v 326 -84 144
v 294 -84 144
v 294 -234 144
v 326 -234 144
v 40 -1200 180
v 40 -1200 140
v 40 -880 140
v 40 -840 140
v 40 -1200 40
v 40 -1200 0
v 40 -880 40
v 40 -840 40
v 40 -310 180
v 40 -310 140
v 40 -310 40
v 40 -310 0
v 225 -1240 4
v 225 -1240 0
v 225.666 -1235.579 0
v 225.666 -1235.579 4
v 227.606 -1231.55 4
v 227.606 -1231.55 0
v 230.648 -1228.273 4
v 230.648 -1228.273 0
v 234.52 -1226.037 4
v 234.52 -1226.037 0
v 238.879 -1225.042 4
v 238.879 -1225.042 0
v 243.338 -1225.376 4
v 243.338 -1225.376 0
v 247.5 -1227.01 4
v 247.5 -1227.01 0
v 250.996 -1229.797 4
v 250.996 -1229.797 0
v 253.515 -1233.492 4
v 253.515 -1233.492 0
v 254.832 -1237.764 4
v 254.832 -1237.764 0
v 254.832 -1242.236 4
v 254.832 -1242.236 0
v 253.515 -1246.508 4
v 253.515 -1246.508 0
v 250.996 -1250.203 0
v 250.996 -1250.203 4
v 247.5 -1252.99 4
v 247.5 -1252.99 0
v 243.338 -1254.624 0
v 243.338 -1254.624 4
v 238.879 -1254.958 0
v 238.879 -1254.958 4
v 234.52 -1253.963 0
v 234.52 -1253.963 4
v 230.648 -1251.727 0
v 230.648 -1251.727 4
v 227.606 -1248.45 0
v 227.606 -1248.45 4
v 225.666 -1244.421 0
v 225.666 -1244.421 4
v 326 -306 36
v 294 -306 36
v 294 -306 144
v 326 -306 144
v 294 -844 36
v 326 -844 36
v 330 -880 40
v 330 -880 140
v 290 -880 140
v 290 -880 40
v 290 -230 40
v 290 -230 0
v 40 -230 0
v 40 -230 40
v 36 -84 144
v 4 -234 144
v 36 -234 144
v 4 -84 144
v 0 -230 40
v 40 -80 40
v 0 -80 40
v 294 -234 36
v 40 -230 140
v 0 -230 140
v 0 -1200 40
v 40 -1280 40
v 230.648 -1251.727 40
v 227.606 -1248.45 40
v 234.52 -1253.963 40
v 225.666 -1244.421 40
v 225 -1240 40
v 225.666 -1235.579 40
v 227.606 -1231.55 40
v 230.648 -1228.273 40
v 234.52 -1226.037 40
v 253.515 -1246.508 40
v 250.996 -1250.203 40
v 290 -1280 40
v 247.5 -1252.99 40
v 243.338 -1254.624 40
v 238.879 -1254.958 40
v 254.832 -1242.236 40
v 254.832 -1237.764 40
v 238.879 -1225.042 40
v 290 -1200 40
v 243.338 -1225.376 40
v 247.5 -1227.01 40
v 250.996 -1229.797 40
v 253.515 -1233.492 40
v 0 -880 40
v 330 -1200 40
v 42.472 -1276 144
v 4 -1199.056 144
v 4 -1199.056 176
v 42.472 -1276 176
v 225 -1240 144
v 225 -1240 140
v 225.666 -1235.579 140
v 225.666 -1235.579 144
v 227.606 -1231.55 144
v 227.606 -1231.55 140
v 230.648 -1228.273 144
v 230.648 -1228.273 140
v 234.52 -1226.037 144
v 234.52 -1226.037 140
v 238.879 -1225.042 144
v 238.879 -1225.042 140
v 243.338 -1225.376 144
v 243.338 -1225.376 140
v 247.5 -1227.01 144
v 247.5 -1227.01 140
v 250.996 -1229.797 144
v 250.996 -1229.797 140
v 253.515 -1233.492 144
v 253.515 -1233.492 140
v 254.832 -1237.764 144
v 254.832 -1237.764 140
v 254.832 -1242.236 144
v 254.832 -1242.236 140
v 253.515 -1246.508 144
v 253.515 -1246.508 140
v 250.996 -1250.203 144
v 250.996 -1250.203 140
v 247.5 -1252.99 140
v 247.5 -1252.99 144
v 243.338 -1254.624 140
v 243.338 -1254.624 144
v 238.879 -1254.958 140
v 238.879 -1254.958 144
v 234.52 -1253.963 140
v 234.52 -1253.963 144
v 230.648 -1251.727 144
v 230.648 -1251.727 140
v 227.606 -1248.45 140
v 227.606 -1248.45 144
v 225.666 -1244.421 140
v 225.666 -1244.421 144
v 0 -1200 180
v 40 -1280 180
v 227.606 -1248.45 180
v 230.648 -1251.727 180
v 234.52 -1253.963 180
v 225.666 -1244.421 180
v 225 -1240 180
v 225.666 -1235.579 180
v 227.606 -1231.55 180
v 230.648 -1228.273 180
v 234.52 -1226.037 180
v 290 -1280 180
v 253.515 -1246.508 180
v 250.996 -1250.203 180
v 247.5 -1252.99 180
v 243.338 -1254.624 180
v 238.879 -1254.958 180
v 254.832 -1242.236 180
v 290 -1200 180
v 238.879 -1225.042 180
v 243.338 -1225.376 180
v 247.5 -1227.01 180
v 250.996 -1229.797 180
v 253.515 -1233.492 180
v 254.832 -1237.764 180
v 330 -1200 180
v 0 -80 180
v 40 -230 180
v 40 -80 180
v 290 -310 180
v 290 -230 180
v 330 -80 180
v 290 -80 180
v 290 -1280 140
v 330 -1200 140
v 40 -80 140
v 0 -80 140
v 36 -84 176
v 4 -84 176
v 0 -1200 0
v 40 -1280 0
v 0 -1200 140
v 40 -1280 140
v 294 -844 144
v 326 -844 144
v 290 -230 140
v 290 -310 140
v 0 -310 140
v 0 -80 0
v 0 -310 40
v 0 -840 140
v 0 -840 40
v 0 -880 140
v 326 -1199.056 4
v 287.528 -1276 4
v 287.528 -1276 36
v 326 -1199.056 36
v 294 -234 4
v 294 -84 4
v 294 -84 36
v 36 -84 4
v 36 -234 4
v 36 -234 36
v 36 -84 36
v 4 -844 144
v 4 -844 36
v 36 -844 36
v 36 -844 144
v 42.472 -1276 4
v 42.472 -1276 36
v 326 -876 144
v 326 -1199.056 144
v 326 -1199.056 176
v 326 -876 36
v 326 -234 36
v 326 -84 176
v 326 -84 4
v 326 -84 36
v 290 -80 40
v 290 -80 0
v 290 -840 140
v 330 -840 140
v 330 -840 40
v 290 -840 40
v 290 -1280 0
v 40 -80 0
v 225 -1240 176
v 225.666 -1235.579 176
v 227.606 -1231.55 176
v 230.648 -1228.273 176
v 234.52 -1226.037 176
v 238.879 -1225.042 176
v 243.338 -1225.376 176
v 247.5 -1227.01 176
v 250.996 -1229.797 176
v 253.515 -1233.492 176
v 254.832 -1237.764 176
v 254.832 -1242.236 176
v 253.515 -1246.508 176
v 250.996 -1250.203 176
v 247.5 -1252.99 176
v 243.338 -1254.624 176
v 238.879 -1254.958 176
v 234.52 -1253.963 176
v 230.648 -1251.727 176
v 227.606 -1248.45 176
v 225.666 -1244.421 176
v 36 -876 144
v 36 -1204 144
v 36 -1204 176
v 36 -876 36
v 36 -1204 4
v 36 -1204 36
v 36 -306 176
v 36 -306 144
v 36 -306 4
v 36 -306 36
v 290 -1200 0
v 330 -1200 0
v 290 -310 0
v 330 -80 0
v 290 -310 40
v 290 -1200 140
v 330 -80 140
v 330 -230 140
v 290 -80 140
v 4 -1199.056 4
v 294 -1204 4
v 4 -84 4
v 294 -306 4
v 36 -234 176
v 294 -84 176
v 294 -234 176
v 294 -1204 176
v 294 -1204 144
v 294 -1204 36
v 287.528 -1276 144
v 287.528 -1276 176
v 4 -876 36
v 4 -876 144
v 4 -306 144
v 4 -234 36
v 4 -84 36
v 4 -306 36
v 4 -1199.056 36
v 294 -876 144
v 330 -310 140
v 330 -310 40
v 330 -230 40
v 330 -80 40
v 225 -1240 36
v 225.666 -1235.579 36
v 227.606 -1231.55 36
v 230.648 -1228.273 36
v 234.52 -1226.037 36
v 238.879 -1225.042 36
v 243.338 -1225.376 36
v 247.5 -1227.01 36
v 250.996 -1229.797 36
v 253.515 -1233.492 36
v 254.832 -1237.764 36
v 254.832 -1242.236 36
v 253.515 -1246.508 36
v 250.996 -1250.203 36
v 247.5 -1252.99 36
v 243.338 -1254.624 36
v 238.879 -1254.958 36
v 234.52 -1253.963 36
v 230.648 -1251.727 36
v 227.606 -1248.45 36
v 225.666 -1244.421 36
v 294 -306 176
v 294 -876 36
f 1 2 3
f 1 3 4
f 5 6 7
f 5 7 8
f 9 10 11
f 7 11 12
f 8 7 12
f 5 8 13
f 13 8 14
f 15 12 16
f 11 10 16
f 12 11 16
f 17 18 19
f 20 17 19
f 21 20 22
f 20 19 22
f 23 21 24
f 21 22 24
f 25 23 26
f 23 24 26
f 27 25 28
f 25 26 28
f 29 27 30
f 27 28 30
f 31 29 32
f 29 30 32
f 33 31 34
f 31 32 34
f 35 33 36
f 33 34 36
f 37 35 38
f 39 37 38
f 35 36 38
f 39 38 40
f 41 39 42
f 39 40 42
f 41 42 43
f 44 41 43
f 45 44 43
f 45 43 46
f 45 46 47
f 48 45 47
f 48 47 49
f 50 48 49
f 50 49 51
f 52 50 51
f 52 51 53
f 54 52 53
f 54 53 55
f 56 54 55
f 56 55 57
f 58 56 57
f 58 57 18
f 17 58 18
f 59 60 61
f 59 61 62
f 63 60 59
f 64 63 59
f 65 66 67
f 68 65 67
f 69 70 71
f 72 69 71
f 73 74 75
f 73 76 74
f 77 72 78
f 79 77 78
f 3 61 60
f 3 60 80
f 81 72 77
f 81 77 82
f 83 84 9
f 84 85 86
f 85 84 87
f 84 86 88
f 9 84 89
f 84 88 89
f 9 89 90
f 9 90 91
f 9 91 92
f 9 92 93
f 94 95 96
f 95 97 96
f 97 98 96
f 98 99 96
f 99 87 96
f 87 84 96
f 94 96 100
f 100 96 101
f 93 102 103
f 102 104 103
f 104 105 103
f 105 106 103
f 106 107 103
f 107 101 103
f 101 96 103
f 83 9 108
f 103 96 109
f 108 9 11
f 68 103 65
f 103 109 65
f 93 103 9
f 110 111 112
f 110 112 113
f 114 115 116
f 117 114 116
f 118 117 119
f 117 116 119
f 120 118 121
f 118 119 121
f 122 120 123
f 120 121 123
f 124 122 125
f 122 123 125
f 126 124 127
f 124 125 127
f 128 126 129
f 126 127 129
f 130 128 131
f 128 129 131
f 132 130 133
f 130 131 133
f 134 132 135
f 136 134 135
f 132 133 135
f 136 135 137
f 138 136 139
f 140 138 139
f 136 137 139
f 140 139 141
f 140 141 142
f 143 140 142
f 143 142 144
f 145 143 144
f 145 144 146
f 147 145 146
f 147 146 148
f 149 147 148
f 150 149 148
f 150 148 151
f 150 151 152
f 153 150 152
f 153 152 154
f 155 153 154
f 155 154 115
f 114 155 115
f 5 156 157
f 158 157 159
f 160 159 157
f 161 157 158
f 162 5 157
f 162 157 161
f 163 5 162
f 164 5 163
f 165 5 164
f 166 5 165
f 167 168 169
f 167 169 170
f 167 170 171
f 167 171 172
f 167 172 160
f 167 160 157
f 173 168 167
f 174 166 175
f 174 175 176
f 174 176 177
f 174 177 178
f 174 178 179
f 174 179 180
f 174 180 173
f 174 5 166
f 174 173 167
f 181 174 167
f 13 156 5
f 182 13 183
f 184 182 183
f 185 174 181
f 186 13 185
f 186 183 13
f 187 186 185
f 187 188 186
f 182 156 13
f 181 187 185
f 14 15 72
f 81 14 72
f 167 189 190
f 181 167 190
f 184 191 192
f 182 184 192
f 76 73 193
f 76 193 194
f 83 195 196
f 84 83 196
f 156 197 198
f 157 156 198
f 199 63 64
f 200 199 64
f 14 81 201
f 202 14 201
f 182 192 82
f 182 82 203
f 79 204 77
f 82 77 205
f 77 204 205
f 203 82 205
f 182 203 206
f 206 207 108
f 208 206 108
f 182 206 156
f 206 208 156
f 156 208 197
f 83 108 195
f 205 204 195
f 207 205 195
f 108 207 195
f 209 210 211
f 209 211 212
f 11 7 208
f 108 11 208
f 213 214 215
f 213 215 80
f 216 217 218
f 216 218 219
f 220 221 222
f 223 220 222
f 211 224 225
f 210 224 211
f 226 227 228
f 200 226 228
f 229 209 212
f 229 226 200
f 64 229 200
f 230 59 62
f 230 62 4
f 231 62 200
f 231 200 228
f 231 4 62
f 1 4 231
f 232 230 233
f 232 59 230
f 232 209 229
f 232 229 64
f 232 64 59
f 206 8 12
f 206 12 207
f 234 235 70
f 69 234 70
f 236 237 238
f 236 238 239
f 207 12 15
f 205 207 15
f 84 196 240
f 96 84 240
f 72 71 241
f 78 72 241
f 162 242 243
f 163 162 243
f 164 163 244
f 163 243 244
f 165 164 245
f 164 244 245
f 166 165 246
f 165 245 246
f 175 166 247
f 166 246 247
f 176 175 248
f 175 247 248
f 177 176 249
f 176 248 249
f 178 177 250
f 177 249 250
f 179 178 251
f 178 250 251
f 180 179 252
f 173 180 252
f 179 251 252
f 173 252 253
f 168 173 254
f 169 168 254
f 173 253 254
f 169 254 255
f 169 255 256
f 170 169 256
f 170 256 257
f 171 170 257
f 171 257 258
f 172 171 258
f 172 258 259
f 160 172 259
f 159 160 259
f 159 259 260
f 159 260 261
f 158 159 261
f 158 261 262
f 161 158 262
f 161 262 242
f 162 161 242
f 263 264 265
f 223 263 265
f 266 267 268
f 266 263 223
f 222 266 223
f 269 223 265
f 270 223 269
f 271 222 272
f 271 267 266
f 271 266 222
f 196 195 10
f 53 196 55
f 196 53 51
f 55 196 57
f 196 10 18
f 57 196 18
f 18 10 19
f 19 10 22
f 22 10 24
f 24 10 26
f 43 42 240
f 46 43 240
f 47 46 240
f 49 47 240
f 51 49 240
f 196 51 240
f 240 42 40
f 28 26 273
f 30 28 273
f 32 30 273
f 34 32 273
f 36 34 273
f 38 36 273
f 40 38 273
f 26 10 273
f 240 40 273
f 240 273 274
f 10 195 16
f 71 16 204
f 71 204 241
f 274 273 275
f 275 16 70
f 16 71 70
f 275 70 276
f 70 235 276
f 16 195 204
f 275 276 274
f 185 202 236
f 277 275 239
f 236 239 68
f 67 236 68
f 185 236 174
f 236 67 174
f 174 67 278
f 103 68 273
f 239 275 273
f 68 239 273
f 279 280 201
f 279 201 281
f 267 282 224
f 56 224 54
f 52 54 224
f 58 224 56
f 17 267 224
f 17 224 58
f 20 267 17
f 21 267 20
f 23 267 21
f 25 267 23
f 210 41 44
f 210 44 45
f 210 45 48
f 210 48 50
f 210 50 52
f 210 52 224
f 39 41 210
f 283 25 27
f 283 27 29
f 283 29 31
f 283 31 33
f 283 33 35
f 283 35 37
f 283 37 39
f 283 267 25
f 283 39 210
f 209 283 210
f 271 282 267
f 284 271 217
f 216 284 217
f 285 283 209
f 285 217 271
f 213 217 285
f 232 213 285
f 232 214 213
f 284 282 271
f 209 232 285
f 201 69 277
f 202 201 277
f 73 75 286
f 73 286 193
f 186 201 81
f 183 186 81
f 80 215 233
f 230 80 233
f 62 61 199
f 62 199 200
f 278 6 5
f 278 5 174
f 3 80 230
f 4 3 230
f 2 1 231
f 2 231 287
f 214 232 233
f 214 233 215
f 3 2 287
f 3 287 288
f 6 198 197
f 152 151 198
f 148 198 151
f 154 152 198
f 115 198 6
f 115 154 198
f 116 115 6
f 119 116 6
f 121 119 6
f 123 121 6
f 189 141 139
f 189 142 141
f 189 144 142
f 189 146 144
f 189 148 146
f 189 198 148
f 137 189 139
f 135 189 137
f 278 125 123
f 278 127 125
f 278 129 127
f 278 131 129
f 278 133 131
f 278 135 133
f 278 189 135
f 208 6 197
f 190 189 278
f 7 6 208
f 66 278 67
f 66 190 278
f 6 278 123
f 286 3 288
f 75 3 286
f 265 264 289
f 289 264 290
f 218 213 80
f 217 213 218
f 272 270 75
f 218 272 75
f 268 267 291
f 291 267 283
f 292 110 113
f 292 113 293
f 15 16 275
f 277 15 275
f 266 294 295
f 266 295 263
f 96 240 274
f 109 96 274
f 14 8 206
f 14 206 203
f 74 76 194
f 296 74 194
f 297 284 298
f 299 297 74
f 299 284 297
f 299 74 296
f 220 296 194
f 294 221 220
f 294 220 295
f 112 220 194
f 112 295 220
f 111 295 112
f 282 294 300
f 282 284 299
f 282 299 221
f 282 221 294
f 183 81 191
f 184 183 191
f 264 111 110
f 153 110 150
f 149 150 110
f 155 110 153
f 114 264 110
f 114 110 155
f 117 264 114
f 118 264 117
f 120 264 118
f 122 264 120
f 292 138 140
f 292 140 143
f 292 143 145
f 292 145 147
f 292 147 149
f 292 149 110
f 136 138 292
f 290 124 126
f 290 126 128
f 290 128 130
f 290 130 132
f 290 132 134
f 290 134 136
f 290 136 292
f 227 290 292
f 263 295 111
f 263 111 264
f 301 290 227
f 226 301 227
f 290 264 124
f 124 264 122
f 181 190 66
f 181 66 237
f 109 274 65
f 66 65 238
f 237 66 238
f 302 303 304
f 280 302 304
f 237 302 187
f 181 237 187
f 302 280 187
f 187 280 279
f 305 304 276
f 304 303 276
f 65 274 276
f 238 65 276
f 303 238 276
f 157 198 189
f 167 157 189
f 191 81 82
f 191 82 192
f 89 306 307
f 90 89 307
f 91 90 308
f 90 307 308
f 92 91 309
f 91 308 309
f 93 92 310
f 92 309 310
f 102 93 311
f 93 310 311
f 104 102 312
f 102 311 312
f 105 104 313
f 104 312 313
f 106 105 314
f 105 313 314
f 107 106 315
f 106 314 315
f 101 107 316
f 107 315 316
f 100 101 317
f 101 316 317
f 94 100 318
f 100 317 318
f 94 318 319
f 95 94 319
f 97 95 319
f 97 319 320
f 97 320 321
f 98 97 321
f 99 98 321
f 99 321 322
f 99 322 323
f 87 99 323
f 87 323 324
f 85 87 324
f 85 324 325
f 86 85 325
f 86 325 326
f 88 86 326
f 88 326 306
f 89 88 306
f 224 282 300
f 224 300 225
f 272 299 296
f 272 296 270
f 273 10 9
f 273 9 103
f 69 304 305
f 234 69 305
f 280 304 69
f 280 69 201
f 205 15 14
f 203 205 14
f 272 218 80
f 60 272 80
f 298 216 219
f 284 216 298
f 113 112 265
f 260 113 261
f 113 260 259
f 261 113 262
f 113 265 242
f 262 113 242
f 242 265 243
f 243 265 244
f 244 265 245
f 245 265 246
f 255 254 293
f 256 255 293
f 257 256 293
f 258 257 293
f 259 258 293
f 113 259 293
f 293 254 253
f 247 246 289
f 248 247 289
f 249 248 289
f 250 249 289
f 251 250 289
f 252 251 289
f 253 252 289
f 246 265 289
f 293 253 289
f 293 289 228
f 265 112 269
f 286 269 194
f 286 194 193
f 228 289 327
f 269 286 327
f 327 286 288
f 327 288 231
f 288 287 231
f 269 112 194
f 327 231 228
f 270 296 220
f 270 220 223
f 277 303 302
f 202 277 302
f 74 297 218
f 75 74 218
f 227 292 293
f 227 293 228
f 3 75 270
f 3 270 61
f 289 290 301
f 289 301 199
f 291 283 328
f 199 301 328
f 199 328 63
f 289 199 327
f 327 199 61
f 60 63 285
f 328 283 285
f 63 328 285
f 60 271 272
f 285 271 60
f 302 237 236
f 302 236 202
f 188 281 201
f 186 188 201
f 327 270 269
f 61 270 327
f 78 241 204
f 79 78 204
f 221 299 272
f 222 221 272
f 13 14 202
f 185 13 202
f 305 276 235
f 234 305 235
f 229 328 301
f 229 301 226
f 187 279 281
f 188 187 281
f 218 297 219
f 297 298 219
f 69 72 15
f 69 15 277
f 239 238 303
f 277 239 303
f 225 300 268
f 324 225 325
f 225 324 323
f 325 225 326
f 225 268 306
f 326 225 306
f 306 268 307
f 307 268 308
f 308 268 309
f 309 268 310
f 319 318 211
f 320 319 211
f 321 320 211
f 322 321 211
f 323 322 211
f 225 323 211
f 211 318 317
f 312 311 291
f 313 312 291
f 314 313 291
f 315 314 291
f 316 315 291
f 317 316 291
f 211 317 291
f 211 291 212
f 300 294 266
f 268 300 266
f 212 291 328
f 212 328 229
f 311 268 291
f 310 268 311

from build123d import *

# Parameters (mm, degrees)
ESQUISSE1_W                  = 250
ESQUISSE1_H                  = 890
BOSS_EXTRU_1_DEPTH           = 180
ESQUISSE2_W                  = 250
ESQUISSE2_H                  = 100
ENL_V_MAT_EXTRU_1_DEPTH      = 1258.497514908
ENL_V_MAT_EXTRU_2_DEPTH      = 1325.726386844
ENL_V_MAT_EXTRU_2_DEPTH_BACK = 1325.726386844
ESQUISSE3_W                  = 100
ESQUISSE3_H                  = 230
ESQUISSE3_H_2                = 970
BOSS_EXTRU_2_REACH           = 1331.248
ESQUISSE6_W                  = 40
ESQUISSE6_H                  = 40
COQUE1_START                 = 4
COQUE1_OUTLINE_W             = 258
COQUE1_OUTLINE_H             = 898
COQUE1_DEPTH                 = 32
COQUE1_START_2               = 144
COQUE1_2_OUTLINE_W           = 258
COQUE1_2_OUTLINE_H           = 898
COQUE1_2_DEPTH               = 32
COQUE1_START_3               = 36
COQUE1_3_OUTLINE_W           = 32
COQUE1_3_OUTLINE_H           = 72
COQUE1_3_OUTLINE_H_2         = 32
COQUE1_3_DEPTH               = 108
ESQUISSE8_R                  = 15
ENL_V_MAT_EXTRU_5_DEPTH      = 1335.053971922


# Read off the part's stored shape, not the designer's step: Coque1
with BuildPart() as part:
    # Esquisse1 → Boss.-Extru.1 (new body)
    with BuildSketch(Plane.XY):
        Polygon((0, -80), (0, -1200), (40, -1280), (290, -1280), (330, -1200), (330, -80), (290, -80), (290, -230), (40, -230), (40, -80), align=None)
        with Locations((165, -755)):
            Rectangle(ESQUISSE1_W, ESQUISSE1_H, mode=Mode.SUBTRACT)
    extrude(amount=BOSS_EXTRU_1_DEPTH)

    # Esquisse2 → Enlèv. mat.-Extru.1 (cut, through all)
    with BuildSketch(Plane(origin=(0, -80, 0), x_dir=(1, 0, 0), z_dir=(0, 1, 0))):
        with Locations((165, -90)):
            Rectangle(ESQUISSE2_W, ESQUISSE2_H)
    extrude(amount=-ENL_V_MAT_EXTRU_1_DEPTH, mode=Mode.SUBTRACT)

    # Esquisse3 → Enlèv. mat.-Extru.2 (cut, two sides: drawn at the far end of the back side and taken through both)
    with BuildSketch(Plane.ZY.offset(-290).offset(-ENL_V_MAT_EXTRU_2_DEPTH_BACK)):
        with Locations((90, -115)):
            Rectangle(ESQUISSE3_W, ESQUISSE3_H)
        with Locations((90, -795)):
            Rectangle(ESQUISSE3_W, ESQUISSE3_H_2)
    extrude(amount=ENL_V_MAT_EXTRU_2_DEPTH + ENL_V_MAT_EXTRU_2_DEPTH_BACK, mode=Mode.SUBTRACT)

    # Esquisse6 → Boss.-Extru.2 (add, up to next)
    with BuildSketch(Plane(origin=(0, 0, 140), x_dir=(-1, 0, 0), z_dir=(0, 0, -1)), mode=Mode.PRIVATE) as boss_extru_2_sk1:
        with Locations((-310, -860)):
            Rectangle(ESQUISSE6_W, ESQUISSE6_H)
    boss_extru_2_tool1 = extrude(boss_extru_2_sk1.sketch, amount=BOSS_EXTRU_2_REACH, mode=Mode.PRIVATE) - part.part
    # Esquisse6 → Boss.-Extru.2 (add, up to next)
    with BuildSketch(Plane(origin=(0, 0, 140), x_dir=(-1, 0, 0), z_dir=(0, 0, -1)), mode=Mode.PRIVATE) as boss_extru_2_sk2:
        with Locations((-20, -860)):
            Rectangle(ESQUISSE6_W, ESQUISSE6_H)
    boss_extru_2_tool2 = extrude(boss_extru_2_sk2.sketch, amount=BOSS_EXTRU_2_REACH, mode=Mode.PRIVATE) - part.part
    add(boss_extru_2_tool1.solids().sort_by_distance((310, -860, 140))[0])
    add(boss_extru_2_tool2.solids().sort_by_distance((20, -860, 140))[0])

    # Coque1 outline → Coque1 (cut)
    with BuildSketch(Plane.XY.offset(COQUE1_START)):
        Polygon((294, -234), (36, -234), (36, -84), (4, -84), (4, -1199.05572809), (42.472135955, -1276), (287.527864045, -1276), (326, -1199.05572809), (326, -84), (294, -84), align=None)
        with Locations((165, -755)):
            Rectangle(COQUE1_OUTLINE_W, COQUE1_OUTLINE_H, mode=Mode.SUBTRACT)
    extrude(amount=COQUE1_DEPTH, mode=Mode.SUBTRACT)

    # Coque1 2 outline → Coque1 2 (cut)
    with BuildSketch(Plane.XY.offset(COQUE1_START_2)):
        Polygon((294, -234), (36, -234), (36, -84), (4, -84), (4, -1199.05572809), (42.472135955, -1276), (287.527864045, -1276), (326, -1199.05572809), (326, -84), (294, -84), align=None)
        with Locations((165, -755)):
            Rectangle(COQUE1_2_OUTLINE_W, COQUE1_2_OUTLINE_H, mode=Mode.SUBTRACT)
    extrude(amount=COQUE1_2_DEPTH, mode=Mode.SUBTRACT)

    # Coque1 3 outline → Coque1 3 (cut)
    with BuildSketch(Plane.XY.offset(COQUE1_START_3)):
        with Locations((310, -270)):
            Rectangle(COQUE1_3_OUTLINE_W, COQUE1_3_OUTLINE_H)
        with Locations((310, -860)):
            Rectangle(COQUE1_3_OUTLINE_W, COQUE1_3_OUTLINE_H_2)
        with Locations((20, -270)):
            Rectangle(COQUE1_3_OUTLINE_W, COQUE1_3_OUTLINE_H)
        with Locations((20, -860)):
            Rectangle(COQUE1_3_OUTLINE_W, COQUE1_3_OUTLINE_H_2)
    extrude(amount=COQUE1_3_DEPTH, mode=Mode.SUBTRACT)

    # Esquisse8 → Enlèv. mat.-Extru.5 (cut, through all)
    with BuildSketch(Plane(origin=(0, 0, 0), x_dir=(-1, 0, 0), z_dir=(0, 0, -1))):
        with Locations((-240, -1240)):
            Circle(ESQUISSE8_R)
    extrude(amount=-ENL_V_MAT_EXTRU_5_DEPTH, mode=Mode.SUBTRACT)


solid = part.part
